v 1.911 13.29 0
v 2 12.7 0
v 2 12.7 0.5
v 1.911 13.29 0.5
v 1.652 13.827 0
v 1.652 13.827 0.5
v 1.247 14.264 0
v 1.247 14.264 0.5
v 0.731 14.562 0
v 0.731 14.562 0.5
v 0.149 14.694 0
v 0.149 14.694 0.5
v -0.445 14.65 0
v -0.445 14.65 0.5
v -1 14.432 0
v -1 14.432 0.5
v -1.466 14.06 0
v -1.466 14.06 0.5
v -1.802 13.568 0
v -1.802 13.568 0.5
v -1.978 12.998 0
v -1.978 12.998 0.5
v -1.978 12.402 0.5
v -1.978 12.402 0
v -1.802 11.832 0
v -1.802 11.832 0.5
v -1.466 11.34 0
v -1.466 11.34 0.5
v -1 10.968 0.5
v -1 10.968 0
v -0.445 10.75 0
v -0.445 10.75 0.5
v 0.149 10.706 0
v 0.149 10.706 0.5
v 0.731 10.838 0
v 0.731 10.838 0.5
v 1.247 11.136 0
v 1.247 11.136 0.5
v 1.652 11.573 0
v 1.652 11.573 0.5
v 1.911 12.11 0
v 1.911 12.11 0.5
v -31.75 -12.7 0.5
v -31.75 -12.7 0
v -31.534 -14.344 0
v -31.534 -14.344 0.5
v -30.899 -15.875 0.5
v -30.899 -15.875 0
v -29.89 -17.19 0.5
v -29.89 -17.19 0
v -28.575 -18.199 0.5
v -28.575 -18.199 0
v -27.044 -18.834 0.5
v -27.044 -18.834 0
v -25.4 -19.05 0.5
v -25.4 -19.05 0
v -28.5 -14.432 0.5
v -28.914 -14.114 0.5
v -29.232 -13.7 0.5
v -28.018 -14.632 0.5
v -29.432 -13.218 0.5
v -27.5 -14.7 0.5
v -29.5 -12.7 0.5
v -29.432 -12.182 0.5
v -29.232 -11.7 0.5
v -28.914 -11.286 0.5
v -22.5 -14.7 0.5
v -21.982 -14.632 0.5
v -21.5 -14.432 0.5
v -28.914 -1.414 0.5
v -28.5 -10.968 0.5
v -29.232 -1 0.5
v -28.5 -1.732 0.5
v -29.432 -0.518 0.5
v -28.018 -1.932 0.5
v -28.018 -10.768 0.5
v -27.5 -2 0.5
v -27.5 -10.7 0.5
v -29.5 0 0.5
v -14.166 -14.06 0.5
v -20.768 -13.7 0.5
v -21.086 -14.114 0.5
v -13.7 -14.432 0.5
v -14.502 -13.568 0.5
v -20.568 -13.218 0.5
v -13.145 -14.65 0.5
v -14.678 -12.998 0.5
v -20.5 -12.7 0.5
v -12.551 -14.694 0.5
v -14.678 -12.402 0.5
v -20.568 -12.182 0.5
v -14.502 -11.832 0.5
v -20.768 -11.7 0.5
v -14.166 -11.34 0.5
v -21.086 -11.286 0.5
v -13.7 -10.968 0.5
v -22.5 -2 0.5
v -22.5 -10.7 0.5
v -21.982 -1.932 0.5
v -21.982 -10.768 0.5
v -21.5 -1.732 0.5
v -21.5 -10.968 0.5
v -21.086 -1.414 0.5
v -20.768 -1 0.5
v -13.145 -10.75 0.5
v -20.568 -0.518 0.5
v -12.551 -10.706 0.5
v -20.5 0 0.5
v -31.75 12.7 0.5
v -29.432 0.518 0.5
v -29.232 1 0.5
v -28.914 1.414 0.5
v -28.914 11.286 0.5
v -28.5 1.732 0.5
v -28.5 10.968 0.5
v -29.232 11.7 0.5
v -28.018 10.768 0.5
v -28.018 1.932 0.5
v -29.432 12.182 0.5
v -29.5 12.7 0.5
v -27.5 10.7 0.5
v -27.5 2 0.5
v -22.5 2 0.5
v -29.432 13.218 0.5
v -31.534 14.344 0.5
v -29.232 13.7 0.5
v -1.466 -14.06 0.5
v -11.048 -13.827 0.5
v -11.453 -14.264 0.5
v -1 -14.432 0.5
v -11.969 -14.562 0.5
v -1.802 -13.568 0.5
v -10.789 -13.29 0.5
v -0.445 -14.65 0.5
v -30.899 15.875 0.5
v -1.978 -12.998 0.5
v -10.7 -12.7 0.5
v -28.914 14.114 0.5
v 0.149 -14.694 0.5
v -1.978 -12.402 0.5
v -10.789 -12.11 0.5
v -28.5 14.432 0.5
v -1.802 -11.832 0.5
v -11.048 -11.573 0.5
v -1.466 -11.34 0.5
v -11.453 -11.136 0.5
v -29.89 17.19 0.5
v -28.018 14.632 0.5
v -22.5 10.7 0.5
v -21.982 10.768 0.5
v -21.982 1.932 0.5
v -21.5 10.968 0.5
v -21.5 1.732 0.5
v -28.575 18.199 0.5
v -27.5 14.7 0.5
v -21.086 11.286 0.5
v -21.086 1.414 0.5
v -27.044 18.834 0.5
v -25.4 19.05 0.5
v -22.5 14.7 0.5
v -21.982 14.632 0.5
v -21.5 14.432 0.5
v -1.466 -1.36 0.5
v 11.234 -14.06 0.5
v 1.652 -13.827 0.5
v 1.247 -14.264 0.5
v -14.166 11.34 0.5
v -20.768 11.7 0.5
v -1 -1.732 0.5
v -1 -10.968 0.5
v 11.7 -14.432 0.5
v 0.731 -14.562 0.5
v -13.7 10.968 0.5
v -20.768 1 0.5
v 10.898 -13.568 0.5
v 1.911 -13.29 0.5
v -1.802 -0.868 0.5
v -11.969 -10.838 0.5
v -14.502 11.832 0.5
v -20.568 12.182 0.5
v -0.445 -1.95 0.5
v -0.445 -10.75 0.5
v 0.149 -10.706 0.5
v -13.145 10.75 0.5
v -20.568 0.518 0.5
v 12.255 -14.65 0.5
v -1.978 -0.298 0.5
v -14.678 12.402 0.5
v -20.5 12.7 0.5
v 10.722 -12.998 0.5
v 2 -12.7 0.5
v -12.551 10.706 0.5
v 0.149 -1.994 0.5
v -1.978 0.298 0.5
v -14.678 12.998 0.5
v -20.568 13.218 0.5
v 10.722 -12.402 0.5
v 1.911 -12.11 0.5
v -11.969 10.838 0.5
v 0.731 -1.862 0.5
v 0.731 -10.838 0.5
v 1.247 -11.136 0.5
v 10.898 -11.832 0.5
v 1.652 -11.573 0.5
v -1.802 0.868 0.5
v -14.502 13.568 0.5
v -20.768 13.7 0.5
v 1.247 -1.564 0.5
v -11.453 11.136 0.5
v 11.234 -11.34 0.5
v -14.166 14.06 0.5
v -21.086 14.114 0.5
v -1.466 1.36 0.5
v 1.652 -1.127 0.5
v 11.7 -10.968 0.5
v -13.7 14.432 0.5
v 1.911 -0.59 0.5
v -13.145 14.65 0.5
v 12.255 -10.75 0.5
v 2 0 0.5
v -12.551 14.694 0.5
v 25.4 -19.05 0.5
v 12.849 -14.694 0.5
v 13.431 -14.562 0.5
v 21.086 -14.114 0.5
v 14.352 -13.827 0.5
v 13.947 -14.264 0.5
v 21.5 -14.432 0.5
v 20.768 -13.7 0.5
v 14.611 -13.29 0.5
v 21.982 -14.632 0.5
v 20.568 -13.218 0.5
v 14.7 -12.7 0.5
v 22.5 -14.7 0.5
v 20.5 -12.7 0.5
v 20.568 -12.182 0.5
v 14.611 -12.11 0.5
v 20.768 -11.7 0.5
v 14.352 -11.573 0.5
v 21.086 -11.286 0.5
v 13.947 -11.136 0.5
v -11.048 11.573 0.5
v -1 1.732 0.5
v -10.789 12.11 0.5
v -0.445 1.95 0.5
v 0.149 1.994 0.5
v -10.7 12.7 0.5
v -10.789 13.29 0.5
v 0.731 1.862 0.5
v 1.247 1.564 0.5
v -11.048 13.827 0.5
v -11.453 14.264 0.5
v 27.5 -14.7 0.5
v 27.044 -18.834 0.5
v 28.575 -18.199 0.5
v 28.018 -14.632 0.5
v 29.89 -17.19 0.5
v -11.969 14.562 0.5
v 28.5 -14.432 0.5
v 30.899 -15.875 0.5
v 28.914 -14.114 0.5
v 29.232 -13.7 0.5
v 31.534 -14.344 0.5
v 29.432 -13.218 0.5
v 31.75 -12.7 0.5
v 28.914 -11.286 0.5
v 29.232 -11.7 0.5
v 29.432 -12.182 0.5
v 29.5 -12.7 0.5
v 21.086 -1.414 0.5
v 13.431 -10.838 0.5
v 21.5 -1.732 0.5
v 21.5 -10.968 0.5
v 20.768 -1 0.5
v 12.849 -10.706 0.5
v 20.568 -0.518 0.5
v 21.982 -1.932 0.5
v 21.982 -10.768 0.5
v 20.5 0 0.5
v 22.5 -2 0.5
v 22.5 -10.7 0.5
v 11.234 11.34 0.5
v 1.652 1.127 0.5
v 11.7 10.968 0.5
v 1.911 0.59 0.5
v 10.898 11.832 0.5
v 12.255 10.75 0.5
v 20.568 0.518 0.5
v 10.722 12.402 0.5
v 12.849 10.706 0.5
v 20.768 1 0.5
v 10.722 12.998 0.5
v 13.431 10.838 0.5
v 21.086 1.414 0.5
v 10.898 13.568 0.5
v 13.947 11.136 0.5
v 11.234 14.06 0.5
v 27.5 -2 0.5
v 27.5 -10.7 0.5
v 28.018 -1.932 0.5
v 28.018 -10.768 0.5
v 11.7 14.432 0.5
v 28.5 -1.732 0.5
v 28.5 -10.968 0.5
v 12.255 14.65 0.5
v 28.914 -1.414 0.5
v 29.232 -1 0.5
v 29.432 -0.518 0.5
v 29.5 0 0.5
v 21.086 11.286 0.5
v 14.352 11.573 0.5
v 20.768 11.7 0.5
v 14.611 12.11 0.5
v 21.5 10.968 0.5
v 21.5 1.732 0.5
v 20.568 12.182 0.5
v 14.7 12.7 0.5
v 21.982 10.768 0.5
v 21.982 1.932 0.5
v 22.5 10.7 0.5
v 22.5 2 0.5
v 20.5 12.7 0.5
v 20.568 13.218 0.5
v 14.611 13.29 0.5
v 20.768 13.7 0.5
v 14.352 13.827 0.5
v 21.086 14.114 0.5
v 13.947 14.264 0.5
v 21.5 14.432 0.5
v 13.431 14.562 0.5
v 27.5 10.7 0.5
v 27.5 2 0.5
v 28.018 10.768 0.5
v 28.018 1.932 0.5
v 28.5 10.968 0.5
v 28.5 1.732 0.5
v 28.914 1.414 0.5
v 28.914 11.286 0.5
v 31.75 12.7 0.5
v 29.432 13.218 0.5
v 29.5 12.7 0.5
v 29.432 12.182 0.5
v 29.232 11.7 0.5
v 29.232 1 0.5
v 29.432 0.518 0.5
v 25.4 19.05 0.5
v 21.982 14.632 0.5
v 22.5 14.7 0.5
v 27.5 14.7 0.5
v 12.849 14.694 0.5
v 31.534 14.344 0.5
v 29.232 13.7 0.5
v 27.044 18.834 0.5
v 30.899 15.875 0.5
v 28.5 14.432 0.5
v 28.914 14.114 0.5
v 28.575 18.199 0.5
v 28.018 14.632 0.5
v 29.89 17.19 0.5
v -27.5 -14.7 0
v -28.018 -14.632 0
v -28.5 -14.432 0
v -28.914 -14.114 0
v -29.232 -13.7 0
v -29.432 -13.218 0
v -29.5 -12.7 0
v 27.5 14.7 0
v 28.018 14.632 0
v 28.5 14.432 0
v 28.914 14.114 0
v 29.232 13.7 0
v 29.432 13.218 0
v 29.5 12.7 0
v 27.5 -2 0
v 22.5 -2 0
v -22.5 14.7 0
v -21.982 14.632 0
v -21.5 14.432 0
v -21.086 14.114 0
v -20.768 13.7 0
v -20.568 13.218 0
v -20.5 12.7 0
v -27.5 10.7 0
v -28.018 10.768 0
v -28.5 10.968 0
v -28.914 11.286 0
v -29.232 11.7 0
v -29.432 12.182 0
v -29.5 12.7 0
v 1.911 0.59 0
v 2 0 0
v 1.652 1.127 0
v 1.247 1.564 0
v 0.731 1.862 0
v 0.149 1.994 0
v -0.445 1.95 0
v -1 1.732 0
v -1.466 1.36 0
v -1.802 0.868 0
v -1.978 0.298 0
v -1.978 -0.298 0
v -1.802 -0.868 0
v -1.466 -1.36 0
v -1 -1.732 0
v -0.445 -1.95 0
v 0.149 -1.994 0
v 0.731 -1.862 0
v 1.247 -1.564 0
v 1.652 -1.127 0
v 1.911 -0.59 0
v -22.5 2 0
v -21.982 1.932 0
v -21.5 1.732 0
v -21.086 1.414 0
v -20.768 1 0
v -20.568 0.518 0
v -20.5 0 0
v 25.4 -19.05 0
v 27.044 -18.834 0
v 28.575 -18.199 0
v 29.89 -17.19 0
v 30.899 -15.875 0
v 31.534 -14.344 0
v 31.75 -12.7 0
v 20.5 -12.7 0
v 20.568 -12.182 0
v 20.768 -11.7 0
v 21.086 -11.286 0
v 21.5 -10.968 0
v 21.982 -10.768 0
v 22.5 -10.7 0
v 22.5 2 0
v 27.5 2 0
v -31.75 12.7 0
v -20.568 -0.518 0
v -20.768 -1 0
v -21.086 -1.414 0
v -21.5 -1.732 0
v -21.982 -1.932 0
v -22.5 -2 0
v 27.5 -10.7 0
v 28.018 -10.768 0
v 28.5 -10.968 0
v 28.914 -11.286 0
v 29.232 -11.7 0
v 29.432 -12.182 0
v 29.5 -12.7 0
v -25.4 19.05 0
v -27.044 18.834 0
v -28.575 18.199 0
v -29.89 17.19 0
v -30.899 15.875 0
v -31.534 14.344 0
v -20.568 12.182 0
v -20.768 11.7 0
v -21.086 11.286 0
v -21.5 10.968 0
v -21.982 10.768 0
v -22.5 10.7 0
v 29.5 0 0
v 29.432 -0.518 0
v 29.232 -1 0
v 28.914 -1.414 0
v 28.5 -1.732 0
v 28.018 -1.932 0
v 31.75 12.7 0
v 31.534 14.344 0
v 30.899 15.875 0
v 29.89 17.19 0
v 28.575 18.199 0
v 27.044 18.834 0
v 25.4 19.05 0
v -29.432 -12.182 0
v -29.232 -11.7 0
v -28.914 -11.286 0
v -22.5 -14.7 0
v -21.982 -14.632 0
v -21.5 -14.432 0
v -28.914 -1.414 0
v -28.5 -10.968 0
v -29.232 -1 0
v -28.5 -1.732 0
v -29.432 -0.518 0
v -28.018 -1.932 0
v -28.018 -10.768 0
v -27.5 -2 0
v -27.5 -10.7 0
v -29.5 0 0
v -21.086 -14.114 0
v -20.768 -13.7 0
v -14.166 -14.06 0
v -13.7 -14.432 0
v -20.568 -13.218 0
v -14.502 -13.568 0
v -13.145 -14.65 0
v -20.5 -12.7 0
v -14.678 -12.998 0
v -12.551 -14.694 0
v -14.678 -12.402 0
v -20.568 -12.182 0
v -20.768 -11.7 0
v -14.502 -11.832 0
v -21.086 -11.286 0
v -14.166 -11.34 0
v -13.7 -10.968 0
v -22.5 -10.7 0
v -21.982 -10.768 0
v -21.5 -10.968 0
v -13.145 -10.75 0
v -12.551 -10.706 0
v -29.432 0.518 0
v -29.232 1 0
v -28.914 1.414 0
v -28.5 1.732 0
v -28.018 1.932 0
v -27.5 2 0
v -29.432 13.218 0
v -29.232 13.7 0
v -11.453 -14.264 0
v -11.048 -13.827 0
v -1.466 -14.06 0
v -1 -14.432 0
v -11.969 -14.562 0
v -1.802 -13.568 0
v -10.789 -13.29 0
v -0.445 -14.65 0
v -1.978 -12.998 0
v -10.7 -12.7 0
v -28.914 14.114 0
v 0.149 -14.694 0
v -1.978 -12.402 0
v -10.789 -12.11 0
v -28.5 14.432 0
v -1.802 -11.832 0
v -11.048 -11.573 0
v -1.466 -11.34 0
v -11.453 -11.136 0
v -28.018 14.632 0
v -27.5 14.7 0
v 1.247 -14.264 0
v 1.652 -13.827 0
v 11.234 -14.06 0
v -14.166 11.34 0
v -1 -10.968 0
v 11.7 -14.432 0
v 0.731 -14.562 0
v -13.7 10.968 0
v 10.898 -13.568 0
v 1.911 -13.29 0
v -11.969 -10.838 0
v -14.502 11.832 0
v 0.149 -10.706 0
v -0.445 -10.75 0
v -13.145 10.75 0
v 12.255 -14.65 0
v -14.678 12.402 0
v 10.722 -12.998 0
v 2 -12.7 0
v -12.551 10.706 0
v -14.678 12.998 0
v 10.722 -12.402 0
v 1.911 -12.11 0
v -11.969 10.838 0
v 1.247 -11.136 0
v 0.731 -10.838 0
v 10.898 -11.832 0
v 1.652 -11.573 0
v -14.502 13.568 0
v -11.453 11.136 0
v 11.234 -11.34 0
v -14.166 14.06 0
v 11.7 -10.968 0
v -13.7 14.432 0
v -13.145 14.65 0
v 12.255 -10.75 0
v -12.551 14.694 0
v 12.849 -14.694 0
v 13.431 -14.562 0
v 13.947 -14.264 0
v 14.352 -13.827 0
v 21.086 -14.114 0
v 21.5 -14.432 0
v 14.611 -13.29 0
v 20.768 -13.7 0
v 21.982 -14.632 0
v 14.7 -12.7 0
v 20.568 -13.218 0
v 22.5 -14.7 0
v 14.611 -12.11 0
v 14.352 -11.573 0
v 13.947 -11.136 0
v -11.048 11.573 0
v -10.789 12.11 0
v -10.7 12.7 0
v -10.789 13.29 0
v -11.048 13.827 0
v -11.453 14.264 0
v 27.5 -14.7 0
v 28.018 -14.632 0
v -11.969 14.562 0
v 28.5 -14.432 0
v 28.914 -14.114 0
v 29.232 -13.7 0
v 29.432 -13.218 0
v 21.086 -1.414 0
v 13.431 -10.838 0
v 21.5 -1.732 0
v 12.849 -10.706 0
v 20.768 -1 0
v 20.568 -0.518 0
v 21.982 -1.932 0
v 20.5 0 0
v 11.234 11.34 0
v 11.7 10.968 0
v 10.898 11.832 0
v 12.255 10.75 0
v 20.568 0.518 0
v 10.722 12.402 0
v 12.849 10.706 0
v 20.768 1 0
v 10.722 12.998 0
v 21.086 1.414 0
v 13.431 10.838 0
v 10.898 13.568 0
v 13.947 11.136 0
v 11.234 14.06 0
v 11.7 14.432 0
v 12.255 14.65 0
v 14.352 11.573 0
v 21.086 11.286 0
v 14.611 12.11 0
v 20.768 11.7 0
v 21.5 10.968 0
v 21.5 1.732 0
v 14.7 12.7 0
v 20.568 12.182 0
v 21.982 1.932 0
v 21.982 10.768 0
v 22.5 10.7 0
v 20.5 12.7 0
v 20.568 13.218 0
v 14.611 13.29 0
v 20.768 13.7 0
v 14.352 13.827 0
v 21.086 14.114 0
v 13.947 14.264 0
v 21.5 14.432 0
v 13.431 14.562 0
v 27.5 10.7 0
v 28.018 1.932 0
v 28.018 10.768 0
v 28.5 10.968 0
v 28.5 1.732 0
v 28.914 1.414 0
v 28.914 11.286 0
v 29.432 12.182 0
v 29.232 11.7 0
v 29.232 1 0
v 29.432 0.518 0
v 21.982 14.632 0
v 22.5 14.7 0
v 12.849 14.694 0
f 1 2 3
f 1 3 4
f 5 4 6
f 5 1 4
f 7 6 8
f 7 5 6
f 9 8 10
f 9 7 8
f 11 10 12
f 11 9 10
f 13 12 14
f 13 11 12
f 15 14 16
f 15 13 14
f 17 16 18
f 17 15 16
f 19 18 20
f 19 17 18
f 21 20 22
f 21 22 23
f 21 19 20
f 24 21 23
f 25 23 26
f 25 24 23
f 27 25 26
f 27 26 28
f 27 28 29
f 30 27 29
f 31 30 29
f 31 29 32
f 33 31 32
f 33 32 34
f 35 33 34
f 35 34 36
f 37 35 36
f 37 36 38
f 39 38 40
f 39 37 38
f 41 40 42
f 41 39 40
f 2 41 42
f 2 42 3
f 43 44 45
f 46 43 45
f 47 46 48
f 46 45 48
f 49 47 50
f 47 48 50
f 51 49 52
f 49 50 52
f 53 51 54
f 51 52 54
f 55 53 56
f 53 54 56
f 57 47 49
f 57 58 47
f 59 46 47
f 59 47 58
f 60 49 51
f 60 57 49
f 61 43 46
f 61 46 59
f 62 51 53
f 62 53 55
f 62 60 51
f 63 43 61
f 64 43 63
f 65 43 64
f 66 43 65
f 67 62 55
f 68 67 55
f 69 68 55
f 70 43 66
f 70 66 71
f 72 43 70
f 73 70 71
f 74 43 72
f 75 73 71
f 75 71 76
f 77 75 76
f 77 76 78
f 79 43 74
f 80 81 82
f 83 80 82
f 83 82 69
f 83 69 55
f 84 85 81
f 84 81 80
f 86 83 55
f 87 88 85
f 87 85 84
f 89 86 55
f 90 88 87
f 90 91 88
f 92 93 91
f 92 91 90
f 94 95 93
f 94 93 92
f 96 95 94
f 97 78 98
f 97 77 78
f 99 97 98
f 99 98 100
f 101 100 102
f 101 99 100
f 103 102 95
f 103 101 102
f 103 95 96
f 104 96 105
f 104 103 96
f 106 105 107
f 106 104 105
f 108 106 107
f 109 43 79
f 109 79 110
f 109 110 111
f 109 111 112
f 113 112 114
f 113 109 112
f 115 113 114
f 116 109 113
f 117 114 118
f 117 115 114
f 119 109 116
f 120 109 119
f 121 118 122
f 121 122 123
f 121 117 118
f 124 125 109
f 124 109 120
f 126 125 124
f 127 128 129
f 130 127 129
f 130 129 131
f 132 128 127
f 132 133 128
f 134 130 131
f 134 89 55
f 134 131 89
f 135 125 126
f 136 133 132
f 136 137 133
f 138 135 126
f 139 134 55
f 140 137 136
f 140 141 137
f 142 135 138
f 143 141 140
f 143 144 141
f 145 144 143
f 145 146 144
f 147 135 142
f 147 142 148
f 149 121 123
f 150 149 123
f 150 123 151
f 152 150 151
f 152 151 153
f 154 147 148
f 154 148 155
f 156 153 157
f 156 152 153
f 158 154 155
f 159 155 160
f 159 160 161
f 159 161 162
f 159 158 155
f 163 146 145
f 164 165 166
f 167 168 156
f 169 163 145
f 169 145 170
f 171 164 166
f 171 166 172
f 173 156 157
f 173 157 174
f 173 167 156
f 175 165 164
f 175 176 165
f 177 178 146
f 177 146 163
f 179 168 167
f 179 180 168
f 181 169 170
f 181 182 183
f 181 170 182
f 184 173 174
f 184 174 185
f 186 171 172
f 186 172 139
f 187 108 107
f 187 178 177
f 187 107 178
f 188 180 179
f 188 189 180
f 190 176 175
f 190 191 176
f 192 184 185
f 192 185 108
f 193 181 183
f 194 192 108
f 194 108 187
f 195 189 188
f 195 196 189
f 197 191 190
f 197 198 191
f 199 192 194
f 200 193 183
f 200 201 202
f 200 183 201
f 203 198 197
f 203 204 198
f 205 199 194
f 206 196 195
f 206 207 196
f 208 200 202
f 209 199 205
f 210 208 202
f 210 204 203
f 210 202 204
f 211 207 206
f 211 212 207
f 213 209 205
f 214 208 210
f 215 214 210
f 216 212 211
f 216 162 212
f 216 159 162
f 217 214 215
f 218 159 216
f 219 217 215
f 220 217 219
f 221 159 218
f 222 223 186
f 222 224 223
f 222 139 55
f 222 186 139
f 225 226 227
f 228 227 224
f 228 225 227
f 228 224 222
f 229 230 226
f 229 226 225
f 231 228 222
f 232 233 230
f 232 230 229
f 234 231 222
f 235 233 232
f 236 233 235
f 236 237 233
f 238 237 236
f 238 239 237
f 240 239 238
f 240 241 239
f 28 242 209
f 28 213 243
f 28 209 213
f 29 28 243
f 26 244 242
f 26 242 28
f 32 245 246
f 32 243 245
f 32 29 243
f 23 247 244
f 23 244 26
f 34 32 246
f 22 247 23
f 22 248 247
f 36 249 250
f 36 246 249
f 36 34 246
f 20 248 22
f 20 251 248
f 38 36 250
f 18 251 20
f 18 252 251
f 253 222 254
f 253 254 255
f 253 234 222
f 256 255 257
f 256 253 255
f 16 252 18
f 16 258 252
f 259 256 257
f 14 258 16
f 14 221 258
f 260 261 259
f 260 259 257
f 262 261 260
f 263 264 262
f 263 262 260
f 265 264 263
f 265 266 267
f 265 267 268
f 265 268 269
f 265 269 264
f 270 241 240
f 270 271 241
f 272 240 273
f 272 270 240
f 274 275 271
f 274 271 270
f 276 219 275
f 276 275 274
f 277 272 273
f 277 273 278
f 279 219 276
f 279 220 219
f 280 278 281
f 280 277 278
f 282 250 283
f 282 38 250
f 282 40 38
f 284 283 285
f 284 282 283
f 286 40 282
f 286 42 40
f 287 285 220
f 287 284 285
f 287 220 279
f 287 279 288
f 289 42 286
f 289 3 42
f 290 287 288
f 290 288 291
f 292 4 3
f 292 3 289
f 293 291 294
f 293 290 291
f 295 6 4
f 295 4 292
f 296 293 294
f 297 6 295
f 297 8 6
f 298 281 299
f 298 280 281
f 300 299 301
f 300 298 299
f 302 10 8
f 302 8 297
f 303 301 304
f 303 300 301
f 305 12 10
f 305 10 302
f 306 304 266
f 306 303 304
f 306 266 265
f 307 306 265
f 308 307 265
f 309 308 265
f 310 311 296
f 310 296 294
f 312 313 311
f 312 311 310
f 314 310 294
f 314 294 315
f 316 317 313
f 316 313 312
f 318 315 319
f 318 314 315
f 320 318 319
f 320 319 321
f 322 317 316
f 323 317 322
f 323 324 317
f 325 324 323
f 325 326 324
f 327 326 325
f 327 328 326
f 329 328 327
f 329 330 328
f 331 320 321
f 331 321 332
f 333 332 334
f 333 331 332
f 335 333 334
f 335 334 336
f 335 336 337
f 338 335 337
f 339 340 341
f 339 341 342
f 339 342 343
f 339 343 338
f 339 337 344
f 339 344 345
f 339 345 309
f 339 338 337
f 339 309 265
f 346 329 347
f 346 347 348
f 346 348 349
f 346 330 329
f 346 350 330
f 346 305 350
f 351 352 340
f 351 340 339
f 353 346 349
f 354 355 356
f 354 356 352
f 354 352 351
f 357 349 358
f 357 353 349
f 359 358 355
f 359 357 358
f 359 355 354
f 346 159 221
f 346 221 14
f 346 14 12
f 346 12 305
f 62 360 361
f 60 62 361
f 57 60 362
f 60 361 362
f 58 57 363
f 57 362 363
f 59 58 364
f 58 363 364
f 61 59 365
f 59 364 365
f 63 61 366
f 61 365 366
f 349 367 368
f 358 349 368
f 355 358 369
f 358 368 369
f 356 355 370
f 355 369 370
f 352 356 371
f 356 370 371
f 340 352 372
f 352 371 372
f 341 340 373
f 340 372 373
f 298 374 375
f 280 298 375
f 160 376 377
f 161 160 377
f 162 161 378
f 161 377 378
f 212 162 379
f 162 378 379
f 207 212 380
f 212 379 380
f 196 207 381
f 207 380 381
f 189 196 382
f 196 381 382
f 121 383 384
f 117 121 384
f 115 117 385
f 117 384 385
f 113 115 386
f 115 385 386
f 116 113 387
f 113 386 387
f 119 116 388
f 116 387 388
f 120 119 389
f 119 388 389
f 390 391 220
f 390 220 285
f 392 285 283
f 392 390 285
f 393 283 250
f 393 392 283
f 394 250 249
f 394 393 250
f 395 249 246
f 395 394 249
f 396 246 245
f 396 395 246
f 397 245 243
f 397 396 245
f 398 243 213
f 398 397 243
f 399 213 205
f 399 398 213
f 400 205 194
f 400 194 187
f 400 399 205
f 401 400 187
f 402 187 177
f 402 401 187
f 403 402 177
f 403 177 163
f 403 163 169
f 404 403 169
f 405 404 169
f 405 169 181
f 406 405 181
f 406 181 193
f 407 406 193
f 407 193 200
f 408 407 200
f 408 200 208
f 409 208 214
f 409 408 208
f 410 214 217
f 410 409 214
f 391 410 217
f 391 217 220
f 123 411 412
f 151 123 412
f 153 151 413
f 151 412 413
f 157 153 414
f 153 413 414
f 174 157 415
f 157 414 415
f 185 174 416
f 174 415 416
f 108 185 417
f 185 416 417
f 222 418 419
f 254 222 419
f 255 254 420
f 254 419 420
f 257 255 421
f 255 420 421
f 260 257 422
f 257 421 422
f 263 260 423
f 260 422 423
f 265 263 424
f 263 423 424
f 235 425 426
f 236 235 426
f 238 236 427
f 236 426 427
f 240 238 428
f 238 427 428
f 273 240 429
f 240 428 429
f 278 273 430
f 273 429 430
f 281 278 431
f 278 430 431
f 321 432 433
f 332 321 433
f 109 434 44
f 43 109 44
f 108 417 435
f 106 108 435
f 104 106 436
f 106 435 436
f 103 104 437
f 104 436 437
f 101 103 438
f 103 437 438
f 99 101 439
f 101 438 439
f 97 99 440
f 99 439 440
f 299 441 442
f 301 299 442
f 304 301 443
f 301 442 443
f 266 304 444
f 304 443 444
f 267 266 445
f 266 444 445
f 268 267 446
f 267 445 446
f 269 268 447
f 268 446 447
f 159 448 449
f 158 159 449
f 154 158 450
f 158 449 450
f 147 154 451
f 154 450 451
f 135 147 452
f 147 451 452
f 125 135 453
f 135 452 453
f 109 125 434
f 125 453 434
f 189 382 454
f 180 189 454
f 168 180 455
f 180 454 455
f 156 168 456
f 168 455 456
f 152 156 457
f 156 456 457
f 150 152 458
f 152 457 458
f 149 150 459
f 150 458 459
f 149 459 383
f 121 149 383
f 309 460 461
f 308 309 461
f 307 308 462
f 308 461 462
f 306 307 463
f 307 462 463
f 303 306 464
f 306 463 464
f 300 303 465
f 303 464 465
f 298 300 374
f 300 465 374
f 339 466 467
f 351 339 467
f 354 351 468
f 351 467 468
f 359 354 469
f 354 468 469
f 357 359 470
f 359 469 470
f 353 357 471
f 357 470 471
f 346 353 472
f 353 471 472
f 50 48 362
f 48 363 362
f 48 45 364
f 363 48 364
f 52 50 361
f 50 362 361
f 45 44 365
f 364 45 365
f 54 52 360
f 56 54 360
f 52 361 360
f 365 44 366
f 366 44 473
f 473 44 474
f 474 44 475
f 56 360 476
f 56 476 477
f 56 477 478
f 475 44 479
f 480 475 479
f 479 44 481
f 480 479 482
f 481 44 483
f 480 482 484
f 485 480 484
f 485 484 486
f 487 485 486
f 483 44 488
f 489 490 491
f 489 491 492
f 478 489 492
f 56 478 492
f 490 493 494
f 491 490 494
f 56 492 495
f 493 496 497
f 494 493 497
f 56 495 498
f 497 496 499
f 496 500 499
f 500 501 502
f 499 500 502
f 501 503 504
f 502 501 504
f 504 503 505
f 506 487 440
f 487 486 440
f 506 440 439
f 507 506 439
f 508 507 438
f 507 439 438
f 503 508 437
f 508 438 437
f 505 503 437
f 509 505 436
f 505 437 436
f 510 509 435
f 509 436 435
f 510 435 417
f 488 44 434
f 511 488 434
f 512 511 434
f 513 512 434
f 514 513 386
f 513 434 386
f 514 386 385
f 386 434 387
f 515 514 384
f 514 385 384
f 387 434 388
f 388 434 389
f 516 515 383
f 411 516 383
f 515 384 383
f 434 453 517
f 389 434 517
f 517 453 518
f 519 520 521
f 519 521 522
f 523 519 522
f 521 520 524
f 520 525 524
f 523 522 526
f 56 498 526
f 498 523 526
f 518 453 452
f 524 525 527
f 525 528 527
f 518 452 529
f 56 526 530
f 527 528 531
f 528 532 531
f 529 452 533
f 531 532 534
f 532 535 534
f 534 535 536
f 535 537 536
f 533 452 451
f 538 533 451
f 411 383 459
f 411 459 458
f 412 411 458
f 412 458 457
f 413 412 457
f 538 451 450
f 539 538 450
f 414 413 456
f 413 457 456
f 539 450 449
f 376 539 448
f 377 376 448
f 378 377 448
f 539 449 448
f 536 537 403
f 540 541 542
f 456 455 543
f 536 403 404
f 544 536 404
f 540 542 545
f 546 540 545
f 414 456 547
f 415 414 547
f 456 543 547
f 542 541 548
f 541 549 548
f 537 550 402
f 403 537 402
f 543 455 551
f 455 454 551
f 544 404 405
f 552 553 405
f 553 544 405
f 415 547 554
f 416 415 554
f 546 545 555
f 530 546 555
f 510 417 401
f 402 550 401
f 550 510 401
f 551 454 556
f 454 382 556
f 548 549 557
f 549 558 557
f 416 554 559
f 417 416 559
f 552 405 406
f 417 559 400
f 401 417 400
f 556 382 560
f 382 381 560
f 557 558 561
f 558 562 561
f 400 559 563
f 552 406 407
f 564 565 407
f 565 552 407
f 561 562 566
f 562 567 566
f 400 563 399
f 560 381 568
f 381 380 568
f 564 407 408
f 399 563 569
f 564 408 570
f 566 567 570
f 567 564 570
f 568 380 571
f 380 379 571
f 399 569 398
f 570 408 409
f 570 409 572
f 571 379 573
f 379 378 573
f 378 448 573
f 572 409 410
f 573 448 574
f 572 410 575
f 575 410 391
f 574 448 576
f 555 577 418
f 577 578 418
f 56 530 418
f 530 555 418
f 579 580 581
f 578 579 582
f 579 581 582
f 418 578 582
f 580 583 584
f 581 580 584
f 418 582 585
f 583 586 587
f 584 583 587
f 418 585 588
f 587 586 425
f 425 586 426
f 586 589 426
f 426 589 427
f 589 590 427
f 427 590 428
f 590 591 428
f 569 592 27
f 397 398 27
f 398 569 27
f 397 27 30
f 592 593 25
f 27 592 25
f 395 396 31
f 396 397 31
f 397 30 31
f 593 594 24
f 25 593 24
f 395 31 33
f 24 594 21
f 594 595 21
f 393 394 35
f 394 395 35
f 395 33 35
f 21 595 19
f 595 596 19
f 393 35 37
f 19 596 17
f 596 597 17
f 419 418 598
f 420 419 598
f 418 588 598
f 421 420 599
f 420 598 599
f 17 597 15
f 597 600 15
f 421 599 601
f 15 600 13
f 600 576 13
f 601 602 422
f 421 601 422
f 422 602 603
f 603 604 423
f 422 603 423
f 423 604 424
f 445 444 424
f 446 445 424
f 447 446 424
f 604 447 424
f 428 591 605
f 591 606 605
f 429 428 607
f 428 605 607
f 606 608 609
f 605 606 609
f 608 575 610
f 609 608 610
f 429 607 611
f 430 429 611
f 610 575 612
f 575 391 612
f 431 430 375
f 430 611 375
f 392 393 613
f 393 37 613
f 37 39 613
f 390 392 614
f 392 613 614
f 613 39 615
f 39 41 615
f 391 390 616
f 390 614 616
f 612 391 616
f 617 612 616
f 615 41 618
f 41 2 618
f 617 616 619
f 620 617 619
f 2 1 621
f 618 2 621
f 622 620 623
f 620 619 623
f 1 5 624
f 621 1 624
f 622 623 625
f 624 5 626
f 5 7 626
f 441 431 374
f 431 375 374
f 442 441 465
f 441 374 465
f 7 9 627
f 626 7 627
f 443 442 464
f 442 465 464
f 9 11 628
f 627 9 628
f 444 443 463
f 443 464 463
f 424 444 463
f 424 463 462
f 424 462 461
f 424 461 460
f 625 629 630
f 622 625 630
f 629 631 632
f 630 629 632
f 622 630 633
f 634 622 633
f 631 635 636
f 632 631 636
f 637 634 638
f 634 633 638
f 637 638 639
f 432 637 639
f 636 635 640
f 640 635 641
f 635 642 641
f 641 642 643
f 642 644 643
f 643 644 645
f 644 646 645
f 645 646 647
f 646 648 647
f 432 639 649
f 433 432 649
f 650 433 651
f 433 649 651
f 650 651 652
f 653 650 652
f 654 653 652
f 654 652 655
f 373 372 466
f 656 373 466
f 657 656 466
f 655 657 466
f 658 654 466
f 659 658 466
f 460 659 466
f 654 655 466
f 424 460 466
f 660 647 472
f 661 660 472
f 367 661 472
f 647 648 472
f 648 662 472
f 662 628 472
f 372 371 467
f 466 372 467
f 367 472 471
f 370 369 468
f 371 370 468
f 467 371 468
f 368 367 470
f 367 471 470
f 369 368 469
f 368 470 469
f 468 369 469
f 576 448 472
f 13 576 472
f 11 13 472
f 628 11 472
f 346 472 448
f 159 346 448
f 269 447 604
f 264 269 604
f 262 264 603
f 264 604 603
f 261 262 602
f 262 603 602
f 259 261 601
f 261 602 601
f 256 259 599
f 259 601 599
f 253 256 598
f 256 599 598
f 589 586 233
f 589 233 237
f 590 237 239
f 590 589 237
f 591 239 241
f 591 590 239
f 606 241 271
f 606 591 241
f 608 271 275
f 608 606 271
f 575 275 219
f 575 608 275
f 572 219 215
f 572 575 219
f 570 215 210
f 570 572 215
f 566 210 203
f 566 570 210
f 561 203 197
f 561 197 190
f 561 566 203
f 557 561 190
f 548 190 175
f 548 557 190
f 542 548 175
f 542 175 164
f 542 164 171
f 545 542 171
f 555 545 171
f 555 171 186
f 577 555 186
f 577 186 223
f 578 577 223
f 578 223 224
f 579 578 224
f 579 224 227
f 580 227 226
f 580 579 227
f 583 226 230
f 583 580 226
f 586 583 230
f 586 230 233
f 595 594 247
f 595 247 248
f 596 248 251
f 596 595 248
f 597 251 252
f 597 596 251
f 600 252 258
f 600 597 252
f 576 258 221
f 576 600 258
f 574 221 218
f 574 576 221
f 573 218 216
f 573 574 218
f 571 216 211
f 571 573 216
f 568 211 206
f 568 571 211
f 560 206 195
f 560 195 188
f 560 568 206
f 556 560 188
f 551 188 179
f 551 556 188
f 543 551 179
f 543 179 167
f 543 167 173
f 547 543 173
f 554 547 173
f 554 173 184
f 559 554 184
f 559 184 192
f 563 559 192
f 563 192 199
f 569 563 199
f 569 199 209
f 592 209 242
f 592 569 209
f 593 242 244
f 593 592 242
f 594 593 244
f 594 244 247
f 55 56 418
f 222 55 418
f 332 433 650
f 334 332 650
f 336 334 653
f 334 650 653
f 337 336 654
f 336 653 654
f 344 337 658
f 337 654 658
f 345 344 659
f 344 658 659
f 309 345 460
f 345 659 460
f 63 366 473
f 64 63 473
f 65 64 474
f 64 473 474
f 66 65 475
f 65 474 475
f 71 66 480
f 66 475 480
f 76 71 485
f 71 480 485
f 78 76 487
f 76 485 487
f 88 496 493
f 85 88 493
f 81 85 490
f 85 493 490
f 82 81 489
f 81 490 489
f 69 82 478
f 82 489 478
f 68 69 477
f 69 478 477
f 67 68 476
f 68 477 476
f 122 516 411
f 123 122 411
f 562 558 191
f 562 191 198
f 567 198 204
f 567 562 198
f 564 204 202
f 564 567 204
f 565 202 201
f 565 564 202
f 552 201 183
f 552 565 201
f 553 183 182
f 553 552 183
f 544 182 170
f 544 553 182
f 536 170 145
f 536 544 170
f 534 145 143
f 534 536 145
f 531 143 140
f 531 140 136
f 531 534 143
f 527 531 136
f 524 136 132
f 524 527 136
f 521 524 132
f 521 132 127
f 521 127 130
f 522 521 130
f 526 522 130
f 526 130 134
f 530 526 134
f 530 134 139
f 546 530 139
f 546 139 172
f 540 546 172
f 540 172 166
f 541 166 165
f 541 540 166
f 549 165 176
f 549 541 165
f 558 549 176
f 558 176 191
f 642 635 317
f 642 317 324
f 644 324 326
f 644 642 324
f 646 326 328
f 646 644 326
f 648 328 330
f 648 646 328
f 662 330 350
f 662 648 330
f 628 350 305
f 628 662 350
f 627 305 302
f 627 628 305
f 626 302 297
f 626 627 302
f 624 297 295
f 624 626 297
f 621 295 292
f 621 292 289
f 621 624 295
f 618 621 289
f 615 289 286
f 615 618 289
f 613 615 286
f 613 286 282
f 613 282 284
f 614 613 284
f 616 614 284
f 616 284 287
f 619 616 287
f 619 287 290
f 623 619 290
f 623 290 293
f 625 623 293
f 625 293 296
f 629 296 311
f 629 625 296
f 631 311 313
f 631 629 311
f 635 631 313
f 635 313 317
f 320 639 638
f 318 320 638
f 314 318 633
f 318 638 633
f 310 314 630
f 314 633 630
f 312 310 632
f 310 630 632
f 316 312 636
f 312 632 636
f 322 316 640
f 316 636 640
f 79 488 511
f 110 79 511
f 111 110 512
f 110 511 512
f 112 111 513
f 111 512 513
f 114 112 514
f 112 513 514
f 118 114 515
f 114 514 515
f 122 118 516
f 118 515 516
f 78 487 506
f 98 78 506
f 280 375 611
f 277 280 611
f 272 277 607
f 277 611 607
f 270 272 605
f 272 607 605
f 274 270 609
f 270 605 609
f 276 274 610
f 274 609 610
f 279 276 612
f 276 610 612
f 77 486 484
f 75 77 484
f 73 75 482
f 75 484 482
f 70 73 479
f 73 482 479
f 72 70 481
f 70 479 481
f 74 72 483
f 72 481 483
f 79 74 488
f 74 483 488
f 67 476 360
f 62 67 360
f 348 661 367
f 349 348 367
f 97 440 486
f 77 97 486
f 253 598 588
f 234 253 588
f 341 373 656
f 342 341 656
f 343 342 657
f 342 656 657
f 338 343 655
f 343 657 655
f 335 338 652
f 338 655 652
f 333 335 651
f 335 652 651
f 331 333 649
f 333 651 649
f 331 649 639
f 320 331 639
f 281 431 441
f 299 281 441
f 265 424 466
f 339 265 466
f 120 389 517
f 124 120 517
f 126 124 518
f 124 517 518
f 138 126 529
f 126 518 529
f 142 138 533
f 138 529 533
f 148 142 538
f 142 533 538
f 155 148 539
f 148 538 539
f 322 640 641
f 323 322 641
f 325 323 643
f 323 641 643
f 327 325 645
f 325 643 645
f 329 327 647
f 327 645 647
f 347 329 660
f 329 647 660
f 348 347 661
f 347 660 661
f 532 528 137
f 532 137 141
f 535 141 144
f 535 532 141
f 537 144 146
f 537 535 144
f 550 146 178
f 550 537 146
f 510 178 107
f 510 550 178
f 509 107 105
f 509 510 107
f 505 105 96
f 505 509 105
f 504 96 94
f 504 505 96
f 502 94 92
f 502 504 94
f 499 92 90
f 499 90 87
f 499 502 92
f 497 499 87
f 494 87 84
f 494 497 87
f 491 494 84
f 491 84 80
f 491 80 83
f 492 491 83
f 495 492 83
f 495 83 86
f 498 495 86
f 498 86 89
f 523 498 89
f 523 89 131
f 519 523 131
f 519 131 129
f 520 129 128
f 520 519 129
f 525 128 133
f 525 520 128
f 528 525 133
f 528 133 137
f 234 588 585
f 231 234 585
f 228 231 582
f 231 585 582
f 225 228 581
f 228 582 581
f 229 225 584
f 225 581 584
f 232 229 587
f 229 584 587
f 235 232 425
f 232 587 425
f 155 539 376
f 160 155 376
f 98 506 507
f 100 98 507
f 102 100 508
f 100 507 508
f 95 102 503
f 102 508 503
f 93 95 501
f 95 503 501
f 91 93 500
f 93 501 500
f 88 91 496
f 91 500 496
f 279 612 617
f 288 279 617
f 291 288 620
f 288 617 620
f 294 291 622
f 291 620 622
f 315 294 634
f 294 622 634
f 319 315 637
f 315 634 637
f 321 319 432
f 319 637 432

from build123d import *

# Parameters (mm, degrees)
F0_R     = 2
F1_DEPTH = 0.5


with BuildPart() as f1:
    # F0 (on Top) → F1 (new body)
    with BuildSketch(Plane.XY):
        with BuildLine():
            ThreePointArc((31.75, 12.7), (29.890128, 17.190128), (25.4, 19.05))
            Line((25.4, 19.05), (-25.4, 19.05))
            ThreePointArc((-25.4, 19.05), (-29.890128, 17.190128), (-31.75, 12.7))
            Line((-31.75, 12.7), (-31.75, -12.7))
            ThreePointArc((-31.75, -12.7), (-29.890128, -17.190128), (-25.4, -19.05))
            Line((-25.4, -19.05), (25.4, -19.05))
            ThreePointArc((25.4, -19.05), (29.890128, -17.190128), (31.75, -12.7))
            Line((31.75, -12.7), (31.75, 12.7))
        make_face()
        with BuildLine():
            ThreePointArc((-22.5, -10.7), (-21.085786, -11.285786), (-20.5, -12.7))
            ThreePointArc((-20.5, -12.7), (-21.085786, -14.114214), (-22.5, -14.7))
            Line((-22.5, -14.7), (-27.5, -14.7))
            ThreePointArc((-27.5, -14.7), (-28.914214, -14.114214), (-29.5, -12.7))
            ThreePointArc((-29.5, -12.7), (-28.914214, -11.285786), (-27.5, -10.7))
            Line((-27.5, -10.7), (-22.5, -10.7))
        make_face(mode=Mode.SUBTRACT)
        with Locations((-12.7, -12.7)):
            Circle(F0_R, mode=Mode.SUBTRACT)
        with Locations((0, -12.7)):
            Circle(F0_R, mode=Mode.SUBTRACT)
        with Locations((12.7, -12.7)):
            Circle(F0_R, mode=Mode.SUBTRACT)
        with BuildLine():
            ThreePointArc((22.5, -14.7), (21.085786, -14.114214), (20.5, -12.7))
            ThreePointArc((20.5, -12.7), (21.085786, -11.285786), (22.5, -10.7))
            Line((22.5, -10.7), (27.5, -10.7))
            ThreePointArc((27.5, -10.7), (28.914214, -11.285786), (29.5, -12.7))
            ThreePointArc((29.5, -12.7), (28.914214, -14.114214), (27.5, -14.7))
            Line((27.5, -14.7), (22.5, -14.7))
        make_face(mode=Mode.SUBTRACT)
        with BuildLine():
            ThreePointArc((29.5, 0), (28.914214, -1.414214), (27.5, -2))
            Line((27.5, -2), (22.5, -2))
            ThreePointArc((22.5, -2), (21.085786, -1.414214), (20.5, 0))
            ThreePointArc((20.5, 0), (21.085786, 1.414214), (22.5, 2))
            Line((22.5, 2), (27.5, 2))
            ThreePointArc((27.5, 2), (28.914214, 1.414214), (29.5, 0))
        make_face(mode=Mode.SUBTRACT)
        with BuildLine():
            ThreePointArc((-27.5, -2), (-28.914214, -1.414214), (-29.5, 0))
            ThreePointArc((-29.5, 0), (-28.914214, 1.414214), (-27.5, 2))
            Line((-27.5, 2), (-22.5, 2))
            ThreePointArc((-22.5, 2), (-21.085786, 1.414214), (-20.5, 0))
            ThreePointArc((-20.5, 0), (-21.085786, -1.414214), (-22.5, -2))
            Line((-22.5, -2), (-27.5, -2))
        make_face(mode=Mode.SUBTRACT)
        with BuildLine():
            ThreePointArc((-22.5, 14.7), (-21.085786, 14.114214), (-20.5, 12.7))
            ThreePointArc((-20.5, 12.7), (-21.085786, 11.285786), (-22.5, 10.7))
            Line((-22.5, 10.7), (-27.5, 10.7))
            ThreePointArc((-27.5, 10.7), (-28.914214, 11.285786), (-29.5, 12.7))
            ThreePointArc((-29.5, 12.7), (-28.914214, 14.114214), (-27.5, 14.7))
            Line((-27.5, 14.7), (-22.5, 14.7))
        make_face(mode=Mode.SUBTRACT)
        with Locations((-12.7, 12.7)):
            Circle(F0_R, mode=Mode.SUBTRACT)
        Circle(F0_R, mode=Mode.SUBTRACT)
        with Locations((0, 12.7)):
            Circle(F0_R, mode=Mode.SUBTRACT)
        with Locations((12.7, 12.7)):
            Circle(F0_R, mode=Mode.SUBTRACT)
        with BuildLine():
            ThreePointArc((29.5, 12.7), (28.914214, 11.285786), (27.5, 10.7))
            Line((27.5, 10.7), (22.5, 10.7))
            ThreePointArc((22.5, 10.7), (21.085786, 11.285786), (20.5, 12.7))
            ThreePointArc((20.5, 12.7), (21.085786, 14.114214), (22.5, 14.7))
            Line((22.5, 14.7), (27.5, 14.7))
            ThreePointArc((27.5, 14.7), (28.914214, 14.114214), (29.5, 12.7))
        make_face(mode=Mode.SUBTRACT)
    extrude(amount=F1_DEPTH)


solid = f1.part
